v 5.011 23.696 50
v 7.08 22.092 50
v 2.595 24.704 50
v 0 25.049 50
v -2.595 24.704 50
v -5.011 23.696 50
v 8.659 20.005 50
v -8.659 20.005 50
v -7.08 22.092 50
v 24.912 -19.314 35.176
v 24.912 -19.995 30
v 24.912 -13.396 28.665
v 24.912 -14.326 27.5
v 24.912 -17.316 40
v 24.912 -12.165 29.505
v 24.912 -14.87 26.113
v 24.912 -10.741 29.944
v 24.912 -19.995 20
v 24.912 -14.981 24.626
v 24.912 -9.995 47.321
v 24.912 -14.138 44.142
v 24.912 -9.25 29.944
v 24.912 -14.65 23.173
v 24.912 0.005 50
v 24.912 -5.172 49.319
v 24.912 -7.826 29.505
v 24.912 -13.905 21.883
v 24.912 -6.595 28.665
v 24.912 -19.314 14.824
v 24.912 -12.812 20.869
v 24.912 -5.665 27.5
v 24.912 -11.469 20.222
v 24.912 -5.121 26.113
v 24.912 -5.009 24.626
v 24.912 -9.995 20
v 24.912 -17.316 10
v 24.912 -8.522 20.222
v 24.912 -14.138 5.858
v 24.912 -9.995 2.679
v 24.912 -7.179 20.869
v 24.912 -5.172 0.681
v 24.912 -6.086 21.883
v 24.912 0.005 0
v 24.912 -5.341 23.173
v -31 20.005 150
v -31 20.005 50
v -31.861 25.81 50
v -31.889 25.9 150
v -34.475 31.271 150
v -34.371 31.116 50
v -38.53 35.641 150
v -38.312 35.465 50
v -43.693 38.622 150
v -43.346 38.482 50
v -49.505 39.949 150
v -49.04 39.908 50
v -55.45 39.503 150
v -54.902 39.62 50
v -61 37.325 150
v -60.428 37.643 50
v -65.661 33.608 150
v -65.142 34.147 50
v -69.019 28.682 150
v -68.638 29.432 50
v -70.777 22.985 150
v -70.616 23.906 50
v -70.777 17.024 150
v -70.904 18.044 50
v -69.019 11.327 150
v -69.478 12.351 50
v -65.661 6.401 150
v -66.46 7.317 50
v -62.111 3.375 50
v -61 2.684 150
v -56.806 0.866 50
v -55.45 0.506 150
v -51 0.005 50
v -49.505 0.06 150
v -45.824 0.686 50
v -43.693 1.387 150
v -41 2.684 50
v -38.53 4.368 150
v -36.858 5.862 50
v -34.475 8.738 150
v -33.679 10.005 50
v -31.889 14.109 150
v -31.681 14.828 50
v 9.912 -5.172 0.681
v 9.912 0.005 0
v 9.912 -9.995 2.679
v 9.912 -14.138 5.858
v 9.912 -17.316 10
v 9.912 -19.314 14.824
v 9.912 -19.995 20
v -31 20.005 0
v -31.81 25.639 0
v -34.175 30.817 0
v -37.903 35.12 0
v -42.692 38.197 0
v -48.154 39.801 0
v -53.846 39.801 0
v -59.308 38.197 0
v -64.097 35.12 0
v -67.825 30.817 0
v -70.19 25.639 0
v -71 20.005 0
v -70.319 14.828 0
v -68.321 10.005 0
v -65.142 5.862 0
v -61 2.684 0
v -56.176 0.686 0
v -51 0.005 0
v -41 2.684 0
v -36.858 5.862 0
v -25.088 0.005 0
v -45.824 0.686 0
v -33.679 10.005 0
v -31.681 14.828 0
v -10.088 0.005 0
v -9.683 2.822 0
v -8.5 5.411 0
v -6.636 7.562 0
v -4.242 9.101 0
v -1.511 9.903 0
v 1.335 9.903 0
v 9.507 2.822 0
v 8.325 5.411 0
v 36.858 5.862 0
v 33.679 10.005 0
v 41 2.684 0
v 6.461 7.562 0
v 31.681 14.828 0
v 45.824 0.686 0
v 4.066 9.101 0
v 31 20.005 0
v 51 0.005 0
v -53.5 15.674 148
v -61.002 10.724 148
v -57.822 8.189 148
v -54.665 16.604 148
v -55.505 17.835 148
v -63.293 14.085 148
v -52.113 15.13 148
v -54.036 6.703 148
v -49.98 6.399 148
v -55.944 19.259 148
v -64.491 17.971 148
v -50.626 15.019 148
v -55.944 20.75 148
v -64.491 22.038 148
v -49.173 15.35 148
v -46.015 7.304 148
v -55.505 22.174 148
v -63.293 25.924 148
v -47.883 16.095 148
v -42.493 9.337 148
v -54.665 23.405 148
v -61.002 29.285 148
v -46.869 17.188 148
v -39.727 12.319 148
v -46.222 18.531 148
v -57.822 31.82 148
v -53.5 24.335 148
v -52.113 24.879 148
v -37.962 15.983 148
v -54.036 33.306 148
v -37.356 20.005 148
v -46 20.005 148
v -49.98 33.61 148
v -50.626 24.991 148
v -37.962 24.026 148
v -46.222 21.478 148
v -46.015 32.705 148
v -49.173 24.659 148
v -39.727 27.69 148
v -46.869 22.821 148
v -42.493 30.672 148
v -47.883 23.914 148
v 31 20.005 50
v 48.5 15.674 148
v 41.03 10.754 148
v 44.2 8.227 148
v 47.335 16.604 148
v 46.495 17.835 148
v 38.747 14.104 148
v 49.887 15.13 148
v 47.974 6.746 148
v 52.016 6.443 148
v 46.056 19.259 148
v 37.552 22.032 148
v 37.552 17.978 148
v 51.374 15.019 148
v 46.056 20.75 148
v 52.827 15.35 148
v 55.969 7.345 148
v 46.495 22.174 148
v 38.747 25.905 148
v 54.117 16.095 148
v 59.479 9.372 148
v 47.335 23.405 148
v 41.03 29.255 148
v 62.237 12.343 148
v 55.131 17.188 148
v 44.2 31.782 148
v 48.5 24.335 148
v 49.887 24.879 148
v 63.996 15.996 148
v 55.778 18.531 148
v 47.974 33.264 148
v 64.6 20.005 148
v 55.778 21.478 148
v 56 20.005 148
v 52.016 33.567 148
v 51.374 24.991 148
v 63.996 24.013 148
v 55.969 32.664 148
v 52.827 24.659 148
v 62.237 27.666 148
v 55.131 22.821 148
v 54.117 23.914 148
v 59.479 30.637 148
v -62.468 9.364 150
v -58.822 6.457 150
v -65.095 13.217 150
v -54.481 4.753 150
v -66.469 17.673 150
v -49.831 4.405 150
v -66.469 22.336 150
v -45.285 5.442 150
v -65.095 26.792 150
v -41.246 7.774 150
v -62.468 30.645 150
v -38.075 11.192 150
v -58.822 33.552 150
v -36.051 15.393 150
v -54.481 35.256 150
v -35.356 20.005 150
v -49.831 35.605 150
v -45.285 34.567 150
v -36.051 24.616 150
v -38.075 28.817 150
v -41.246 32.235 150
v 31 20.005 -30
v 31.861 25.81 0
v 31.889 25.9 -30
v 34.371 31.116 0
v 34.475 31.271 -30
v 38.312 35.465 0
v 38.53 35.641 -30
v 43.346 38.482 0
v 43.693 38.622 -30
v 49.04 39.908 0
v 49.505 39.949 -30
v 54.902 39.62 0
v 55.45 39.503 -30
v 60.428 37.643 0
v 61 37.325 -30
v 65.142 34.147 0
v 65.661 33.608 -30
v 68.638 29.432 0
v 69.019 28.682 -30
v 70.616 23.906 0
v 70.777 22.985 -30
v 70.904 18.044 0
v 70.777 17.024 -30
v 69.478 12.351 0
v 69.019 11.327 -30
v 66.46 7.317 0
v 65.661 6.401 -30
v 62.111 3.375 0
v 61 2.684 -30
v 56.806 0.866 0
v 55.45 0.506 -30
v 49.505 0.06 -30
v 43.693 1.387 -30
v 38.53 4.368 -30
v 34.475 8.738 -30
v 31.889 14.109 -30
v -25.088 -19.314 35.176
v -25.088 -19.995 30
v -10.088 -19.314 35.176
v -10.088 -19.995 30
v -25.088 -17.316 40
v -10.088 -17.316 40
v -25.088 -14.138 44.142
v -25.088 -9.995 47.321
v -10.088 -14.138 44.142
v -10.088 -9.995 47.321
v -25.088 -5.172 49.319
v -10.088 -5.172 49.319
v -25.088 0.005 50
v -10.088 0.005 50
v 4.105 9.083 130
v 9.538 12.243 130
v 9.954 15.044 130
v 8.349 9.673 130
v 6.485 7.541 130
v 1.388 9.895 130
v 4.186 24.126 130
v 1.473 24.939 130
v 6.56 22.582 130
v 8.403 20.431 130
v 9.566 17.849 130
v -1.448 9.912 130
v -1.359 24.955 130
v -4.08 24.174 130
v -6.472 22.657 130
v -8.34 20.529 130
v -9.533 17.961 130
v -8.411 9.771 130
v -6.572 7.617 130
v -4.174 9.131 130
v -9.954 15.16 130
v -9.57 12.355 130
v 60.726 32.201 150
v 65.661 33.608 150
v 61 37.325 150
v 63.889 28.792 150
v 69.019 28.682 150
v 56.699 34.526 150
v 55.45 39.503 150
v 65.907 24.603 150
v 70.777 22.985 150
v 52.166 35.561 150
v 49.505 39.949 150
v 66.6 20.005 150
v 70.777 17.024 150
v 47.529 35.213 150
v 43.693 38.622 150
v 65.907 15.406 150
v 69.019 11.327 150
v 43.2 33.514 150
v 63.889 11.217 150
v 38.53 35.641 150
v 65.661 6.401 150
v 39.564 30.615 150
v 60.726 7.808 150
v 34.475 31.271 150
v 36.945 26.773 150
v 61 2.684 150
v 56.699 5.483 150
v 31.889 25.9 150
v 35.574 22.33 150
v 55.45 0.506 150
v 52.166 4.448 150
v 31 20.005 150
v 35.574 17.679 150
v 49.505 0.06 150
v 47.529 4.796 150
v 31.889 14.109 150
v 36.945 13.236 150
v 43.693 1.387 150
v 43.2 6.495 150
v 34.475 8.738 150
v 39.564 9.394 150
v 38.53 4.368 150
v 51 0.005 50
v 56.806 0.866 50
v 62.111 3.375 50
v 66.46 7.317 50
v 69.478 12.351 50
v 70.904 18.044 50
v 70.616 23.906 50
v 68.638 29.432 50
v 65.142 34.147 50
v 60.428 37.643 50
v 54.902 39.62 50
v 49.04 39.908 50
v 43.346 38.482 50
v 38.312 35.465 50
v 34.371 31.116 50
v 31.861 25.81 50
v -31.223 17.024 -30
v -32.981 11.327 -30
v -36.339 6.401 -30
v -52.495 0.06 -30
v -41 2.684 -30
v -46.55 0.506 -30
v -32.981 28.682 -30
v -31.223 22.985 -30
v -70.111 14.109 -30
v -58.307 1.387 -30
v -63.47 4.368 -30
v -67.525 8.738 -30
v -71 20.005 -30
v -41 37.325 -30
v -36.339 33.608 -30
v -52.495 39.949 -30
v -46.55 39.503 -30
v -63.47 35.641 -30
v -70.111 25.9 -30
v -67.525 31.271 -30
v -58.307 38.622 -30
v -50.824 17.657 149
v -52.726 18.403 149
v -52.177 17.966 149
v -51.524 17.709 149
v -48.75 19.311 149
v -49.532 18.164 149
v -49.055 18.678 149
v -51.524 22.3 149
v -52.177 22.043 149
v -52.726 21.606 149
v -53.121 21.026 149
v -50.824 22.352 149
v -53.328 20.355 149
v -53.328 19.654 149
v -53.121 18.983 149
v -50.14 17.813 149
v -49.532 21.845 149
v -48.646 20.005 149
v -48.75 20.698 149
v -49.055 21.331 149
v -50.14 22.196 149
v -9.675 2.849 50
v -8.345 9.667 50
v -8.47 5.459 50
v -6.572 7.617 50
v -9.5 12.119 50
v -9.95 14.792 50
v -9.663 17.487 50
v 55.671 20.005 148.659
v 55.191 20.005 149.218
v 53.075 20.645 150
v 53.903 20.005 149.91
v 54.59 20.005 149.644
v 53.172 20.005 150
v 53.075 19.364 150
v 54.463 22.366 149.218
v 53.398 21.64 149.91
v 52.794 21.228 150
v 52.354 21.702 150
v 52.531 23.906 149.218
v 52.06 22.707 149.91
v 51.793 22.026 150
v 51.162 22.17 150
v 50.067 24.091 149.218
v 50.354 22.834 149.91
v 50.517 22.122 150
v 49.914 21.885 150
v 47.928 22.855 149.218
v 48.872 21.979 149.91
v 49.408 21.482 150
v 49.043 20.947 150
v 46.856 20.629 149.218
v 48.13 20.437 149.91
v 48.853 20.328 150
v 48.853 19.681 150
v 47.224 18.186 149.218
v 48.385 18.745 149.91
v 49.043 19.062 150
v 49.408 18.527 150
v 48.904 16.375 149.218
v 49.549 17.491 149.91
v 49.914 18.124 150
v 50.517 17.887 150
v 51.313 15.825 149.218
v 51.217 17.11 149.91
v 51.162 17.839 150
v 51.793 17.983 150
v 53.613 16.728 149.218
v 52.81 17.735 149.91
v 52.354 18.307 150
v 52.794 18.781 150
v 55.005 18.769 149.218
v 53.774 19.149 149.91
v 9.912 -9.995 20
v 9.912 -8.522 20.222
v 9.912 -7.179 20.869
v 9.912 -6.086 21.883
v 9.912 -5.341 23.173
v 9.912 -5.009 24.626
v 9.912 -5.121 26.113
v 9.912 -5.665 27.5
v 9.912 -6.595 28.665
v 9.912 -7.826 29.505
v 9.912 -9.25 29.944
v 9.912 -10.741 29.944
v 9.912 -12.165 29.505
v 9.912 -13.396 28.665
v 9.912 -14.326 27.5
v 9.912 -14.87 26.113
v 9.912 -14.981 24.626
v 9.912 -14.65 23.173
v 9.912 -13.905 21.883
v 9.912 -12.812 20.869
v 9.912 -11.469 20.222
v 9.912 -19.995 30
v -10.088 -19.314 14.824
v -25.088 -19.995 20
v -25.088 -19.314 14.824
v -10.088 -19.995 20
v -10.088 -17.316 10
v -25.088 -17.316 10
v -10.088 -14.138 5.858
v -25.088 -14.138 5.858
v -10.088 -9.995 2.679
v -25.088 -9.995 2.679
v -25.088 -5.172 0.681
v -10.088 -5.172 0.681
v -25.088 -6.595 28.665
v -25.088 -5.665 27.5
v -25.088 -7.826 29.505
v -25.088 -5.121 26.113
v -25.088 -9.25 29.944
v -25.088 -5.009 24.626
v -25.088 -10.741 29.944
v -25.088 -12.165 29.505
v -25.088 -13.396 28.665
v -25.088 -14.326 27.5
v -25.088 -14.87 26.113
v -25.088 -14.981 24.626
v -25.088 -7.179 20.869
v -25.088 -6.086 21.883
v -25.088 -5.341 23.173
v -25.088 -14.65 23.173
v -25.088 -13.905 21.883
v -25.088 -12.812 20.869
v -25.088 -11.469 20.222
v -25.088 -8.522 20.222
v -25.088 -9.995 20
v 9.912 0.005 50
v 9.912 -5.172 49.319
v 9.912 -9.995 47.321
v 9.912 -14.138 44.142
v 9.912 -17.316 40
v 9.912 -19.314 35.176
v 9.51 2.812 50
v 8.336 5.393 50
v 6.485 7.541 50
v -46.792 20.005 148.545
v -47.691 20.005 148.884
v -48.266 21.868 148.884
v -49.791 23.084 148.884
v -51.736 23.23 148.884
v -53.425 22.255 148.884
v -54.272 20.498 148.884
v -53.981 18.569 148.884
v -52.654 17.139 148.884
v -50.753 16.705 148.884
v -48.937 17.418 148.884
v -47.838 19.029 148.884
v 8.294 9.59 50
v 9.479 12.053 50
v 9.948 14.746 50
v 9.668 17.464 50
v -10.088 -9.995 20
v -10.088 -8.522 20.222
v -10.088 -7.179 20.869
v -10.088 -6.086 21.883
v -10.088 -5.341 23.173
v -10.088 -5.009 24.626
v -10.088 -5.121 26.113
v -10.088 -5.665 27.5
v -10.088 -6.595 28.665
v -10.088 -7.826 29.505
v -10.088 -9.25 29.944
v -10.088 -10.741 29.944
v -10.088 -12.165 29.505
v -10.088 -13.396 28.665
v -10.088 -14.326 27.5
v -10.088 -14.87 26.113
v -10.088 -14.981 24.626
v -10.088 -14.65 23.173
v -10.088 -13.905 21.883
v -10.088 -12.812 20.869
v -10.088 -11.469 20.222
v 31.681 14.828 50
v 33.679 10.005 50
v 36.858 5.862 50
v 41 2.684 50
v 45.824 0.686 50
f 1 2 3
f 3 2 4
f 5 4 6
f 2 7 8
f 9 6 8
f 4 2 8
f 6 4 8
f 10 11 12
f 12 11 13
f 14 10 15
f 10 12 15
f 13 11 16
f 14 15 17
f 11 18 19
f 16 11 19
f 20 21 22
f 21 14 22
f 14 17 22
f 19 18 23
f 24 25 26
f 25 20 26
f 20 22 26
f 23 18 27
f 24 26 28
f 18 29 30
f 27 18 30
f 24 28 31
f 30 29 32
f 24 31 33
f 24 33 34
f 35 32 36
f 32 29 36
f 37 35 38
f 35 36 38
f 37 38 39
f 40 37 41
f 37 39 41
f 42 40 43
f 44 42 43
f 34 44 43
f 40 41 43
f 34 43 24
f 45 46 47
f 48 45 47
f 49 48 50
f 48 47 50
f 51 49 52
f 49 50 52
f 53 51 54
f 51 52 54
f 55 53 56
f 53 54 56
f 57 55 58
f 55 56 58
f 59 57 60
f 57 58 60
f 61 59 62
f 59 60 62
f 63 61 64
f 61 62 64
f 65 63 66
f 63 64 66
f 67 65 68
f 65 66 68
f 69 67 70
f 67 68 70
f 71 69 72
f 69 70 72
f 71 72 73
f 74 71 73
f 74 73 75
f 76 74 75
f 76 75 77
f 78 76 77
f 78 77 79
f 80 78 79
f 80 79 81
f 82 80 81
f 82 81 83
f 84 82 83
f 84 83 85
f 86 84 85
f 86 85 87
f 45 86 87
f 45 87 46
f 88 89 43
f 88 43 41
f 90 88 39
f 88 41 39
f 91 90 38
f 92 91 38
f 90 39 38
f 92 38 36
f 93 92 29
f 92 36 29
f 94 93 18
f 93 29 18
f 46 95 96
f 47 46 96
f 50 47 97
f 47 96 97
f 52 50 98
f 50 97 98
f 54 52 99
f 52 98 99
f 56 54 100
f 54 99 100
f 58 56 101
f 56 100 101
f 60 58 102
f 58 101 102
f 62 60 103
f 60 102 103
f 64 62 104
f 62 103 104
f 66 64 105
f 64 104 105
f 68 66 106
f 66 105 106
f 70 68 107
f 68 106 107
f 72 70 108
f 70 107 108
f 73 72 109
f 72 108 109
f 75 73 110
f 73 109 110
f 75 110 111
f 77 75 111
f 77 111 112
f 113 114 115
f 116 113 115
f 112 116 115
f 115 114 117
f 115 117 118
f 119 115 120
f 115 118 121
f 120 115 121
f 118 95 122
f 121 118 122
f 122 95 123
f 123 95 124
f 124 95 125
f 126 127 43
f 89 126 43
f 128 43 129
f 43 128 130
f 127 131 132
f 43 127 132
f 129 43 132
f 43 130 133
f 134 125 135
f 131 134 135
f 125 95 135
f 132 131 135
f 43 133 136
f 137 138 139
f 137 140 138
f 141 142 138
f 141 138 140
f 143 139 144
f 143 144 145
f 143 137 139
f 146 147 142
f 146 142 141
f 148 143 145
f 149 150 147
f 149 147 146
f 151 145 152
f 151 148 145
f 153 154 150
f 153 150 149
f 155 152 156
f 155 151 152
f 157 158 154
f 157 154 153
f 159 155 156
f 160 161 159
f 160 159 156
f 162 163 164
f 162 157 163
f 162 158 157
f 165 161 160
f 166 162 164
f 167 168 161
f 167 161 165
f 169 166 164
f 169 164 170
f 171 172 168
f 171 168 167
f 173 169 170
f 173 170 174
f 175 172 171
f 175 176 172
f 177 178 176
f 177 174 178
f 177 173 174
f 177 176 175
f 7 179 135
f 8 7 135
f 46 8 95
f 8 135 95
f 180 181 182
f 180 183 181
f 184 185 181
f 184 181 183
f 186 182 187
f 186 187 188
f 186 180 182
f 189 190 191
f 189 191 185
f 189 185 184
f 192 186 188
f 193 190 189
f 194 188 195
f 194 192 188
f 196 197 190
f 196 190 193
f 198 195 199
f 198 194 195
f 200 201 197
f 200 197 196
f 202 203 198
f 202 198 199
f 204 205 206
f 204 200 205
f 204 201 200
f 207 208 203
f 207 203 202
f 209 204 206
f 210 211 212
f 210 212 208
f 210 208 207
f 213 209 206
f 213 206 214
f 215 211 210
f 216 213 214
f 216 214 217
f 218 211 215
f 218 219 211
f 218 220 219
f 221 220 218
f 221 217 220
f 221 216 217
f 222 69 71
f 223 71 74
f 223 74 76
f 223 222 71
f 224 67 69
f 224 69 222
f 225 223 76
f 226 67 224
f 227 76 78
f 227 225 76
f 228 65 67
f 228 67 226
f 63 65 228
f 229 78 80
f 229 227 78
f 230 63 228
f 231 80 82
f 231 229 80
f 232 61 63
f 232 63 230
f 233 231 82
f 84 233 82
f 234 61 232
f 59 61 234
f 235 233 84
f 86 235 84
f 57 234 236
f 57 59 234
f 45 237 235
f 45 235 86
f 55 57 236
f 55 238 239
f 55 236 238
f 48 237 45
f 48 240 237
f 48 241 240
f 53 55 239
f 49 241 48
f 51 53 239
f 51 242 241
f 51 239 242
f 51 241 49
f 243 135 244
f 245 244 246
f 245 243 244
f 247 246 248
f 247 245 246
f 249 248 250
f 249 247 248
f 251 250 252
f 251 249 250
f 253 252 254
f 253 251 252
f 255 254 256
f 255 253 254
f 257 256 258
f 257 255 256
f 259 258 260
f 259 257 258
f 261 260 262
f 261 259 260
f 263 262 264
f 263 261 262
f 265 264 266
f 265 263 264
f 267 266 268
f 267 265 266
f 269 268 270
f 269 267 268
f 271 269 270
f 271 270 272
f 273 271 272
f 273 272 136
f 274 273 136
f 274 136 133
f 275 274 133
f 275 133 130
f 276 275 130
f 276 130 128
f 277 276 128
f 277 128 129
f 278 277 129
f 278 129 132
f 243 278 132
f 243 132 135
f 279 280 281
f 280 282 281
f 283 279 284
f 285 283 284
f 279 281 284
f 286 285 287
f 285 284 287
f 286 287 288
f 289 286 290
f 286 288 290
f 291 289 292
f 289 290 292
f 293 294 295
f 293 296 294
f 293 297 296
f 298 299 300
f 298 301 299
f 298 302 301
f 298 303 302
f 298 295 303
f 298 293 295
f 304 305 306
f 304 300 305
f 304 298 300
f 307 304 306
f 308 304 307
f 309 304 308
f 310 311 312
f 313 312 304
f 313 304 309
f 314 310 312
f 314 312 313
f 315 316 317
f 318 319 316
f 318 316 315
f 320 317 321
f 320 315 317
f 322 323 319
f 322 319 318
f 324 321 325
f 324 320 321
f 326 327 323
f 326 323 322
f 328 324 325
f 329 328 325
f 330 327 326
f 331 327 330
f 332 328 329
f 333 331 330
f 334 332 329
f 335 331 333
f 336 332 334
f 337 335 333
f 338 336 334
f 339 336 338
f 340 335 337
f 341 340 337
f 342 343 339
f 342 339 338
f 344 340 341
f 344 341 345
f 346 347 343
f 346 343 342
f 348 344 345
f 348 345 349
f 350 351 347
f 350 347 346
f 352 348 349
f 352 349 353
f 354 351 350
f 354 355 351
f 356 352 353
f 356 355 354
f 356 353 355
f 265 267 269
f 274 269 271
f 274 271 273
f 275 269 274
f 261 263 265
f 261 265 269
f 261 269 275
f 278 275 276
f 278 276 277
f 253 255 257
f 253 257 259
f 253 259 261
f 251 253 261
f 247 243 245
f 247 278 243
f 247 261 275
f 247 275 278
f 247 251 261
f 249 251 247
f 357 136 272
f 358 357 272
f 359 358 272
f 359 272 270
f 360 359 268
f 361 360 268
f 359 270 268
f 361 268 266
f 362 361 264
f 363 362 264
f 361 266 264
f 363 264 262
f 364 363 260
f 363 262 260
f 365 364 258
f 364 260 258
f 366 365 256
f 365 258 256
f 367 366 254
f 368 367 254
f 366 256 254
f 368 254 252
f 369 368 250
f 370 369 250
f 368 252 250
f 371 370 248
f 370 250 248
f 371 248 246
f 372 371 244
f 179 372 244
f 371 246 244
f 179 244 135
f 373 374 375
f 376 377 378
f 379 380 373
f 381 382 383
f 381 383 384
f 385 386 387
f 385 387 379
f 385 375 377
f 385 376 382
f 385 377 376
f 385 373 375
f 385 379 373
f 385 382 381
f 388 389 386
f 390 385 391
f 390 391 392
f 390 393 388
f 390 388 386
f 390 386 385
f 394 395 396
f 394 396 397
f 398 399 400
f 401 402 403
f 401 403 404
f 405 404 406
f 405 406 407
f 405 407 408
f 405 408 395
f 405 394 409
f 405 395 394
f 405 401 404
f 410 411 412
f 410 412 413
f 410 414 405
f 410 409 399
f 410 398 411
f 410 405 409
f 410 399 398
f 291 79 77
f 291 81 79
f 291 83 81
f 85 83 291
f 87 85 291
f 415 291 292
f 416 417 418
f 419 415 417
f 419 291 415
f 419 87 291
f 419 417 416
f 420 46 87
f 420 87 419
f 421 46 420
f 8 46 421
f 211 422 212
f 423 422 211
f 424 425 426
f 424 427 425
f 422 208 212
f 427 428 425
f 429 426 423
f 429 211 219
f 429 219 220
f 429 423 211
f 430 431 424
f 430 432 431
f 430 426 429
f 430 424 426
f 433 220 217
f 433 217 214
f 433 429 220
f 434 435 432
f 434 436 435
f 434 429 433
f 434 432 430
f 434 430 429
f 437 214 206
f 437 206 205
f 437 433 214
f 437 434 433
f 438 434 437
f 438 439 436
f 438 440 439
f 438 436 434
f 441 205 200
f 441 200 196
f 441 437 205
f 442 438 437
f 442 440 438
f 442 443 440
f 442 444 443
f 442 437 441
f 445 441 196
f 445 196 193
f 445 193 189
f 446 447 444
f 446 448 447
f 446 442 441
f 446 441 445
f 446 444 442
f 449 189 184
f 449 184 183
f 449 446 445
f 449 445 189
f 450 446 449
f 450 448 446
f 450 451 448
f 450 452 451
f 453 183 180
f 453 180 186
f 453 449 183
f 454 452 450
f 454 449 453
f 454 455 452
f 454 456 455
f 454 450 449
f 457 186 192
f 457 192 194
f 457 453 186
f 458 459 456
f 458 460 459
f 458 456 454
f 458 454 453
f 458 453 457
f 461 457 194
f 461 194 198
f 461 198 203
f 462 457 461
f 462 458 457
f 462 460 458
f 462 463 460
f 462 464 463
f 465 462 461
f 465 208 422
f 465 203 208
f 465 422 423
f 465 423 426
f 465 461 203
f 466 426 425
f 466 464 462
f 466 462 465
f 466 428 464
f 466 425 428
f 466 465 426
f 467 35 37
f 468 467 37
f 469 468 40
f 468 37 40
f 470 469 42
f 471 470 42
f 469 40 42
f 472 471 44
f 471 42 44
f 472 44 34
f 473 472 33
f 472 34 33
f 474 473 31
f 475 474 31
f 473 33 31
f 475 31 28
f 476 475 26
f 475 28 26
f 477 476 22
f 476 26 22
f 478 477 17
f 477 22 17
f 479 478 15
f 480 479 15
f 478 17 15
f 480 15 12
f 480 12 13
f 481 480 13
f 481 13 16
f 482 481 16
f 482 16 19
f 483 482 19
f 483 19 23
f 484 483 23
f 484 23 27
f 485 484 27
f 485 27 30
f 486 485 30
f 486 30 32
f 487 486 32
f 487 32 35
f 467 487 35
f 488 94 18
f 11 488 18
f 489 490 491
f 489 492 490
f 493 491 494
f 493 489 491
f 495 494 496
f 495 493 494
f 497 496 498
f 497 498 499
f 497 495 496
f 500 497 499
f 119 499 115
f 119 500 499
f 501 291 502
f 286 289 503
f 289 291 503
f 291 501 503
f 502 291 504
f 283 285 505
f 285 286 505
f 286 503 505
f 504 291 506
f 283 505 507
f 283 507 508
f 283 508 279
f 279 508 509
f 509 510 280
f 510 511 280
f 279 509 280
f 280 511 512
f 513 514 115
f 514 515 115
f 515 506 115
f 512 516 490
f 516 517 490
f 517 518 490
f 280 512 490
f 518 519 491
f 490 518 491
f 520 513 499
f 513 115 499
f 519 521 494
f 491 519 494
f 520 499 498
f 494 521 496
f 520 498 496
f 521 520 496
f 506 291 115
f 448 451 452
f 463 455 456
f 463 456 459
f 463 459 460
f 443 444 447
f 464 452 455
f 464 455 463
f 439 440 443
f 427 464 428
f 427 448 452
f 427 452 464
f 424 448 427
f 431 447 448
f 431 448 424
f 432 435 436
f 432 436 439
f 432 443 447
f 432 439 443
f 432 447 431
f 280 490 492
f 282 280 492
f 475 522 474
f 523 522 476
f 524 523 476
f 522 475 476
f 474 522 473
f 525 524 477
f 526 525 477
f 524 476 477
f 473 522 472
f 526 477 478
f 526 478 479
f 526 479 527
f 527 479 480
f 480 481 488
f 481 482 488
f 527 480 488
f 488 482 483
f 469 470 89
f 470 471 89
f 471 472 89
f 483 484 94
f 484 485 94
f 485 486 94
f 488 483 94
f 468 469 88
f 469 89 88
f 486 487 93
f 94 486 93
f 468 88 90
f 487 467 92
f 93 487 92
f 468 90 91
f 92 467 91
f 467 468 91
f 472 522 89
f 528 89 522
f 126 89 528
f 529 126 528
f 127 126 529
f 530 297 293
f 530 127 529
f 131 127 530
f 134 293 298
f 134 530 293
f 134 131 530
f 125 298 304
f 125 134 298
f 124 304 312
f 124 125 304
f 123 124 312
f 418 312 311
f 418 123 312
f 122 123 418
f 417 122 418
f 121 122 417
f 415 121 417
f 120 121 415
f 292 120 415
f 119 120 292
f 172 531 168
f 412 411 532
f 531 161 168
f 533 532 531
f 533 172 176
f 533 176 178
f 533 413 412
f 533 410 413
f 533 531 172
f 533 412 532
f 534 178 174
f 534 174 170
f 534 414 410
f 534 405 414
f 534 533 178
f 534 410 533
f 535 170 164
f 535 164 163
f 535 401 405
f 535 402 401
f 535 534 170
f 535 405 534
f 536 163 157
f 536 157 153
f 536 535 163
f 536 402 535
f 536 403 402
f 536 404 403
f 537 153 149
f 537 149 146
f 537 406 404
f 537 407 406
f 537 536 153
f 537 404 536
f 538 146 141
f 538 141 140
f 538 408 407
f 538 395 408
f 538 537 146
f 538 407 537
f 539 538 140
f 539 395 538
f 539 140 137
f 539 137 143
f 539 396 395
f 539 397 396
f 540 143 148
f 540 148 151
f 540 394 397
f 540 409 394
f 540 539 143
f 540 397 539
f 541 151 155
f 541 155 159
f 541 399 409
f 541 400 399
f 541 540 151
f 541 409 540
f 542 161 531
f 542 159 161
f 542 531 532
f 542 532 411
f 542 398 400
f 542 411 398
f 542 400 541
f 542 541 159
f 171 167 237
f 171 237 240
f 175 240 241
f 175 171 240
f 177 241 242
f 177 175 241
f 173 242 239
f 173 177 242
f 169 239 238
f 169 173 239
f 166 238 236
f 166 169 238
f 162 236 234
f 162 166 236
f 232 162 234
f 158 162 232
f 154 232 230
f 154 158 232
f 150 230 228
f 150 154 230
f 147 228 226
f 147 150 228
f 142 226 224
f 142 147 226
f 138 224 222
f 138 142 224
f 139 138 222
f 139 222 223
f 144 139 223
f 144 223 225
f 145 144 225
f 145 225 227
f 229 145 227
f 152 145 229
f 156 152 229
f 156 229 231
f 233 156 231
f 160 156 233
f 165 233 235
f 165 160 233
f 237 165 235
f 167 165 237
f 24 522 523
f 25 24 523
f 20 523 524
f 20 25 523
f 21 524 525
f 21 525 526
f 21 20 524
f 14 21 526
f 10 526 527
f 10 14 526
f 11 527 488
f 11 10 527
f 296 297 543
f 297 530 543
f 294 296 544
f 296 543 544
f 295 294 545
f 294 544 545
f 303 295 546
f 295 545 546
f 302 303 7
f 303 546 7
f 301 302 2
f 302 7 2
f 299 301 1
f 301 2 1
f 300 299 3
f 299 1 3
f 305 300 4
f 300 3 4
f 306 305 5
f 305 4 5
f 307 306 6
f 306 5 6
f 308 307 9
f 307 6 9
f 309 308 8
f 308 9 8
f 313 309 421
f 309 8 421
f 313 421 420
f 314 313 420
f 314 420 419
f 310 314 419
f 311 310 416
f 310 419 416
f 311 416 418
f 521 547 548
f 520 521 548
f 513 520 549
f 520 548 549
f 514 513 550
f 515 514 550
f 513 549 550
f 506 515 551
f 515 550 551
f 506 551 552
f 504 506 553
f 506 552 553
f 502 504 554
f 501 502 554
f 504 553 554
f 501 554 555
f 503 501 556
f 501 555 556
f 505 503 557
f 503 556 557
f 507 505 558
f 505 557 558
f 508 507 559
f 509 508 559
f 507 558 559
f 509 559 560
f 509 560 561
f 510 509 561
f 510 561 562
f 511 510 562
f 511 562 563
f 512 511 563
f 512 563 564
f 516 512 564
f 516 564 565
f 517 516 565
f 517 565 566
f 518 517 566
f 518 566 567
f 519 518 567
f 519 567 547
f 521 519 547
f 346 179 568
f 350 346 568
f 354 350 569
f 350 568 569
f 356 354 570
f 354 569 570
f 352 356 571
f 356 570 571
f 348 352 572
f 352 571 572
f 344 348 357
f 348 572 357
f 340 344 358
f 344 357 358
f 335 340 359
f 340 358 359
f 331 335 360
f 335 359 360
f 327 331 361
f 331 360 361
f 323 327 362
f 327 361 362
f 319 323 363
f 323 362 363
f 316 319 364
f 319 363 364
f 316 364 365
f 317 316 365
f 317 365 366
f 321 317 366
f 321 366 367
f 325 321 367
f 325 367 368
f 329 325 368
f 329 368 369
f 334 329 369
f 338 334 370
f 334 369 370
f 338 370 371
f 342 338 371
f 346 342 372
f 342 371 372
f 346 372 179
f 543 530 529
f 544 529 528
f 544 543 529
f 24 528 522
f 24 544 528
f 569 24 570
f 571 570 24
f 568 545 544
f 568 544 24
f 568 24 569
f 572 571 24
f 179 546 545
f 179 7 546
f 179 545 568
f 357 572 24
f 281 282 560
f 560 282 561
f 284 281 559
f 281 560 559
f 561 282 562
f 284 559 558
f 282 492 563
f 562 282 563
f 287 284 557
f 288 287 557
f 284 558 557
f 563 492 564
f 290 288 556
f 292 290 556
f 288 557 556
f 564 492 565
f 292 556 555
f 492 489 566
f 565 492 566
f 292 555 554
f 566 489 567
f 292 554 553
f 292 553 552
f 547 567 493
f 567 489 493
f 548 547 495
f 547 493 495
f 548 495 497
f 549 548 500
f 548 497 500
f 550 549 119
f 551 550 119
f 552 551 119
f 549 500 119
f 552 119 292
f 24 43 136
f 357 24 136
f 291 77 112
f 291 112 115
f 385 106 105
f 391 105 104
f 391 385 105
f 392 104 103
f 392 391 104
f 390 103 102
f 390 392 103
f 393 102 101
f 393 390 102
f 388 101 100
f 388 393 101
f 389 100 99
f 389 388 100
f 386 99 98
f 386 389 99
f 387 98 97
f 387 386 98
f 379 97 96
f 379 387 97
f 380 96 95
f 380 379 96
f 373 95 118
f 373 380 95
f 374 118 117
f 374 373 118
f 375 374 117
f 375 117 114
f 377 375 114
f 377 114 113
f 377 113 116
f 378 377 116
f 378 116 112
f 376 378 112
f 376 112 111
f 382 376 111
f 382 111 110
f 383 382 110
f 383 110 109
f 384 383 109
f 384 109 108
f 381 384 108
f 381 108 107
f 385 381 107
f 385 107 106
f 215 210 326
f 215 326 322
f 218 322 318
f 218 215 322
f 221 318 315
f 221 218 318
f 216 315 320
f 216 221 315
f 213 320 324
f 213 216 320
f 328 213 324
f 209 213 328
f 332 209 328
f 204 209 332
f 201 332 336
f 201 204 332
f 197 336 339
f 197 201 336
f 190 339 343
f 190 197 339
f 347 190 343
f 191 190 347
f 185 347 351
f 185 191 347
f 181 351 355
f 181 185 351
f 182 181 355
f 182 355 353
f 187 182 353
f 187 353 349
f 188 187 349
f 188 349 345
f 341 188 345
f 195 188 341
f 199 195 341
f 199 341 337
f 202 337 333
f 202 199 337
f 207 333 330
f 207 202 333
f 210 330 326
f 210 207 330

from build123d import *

# Parameters (mm, degrees)
BOSS_EXTRUDE1_DEPTH      = 50
SKETCH4_R                = 5
CUT_EXTRUDE1_DEPTH       = 116.323487875
FILLET2_R                = 20
SKETCH6_R                = 20
BOSS_EXTRUDE4_DEPTH      = 100
BOSS_EXTRUDE5_START      = 30
SKETCH7_R                = 20
BOSS_EXTRUDE5_DEPTH      = 30
SKETCH8_R                = 9.954491404
BOSS_EXTRUDE8_DEPTH      = 80
CUT_EXTRUDE2_DEPTH       = 130.001408198
CUT_EXTRUDE2_DEPTH_BACK  = 130.001408198
SKETCH9_R                = 13.643836255
CUT_EXTRUDE3_DEPTH       = 2
BOSS_EXTRUDE9_START      = 148
BOSS_EXTRUDE9_OUTLINE_R  = 5
BOSS_EXTRUDE9_DEPTH      = 1
CHAMFER1_SIZE            = 2
SKETCH11_R               = 13.6
CUT_EXTRUDE4_DEPTH       = 2
BOSS_EXTRUDE10_START     = 148
BOSS_EXTRUDE10_OUTLINE_R = 5
BOSS_EXTRUDE10_DEPTH     = 2
FILLET5_R                = 4
FILLET6_R                = 3
CHAMFER3_SIZE            = 2


# Read off the part's stored shape, not the designer's step: Boss-Extrude9, Boss-Extrude10
# Some blends are built 0.0001 mm under size
with BuildPart() as part:
    # Sketch1 → Boss-Extrude1 (new body)
    with BuildSketch(Plane.XY):
        with BuildLine():
            Line((-25.087834251, -19.995458795), (-10.087834251, -19.995458795))
            Line((-10.087834251, -19.995458795), (-10.087834251, 0.004541205))
            Line((-10.087834251, 0.004541205), (9.912165749, 0.004541205))
            Line((9.912165749, 0.004541205), (9.912165749, -19.995458795))
            Line((9.912165749, -19.995458795), (24.912165749, -19.995458795))
            Line((24.912165749, -19.995458795), (24.912165749, 0.004541205))
            Line((24.912165749, 0.004541205), (51, 0.004541205))
            ThreePointArc((51, 0.004541205), (65.142135624, 34.146676829), (31, 20.004541205))
            Line((31, 20.004541205), (-31, 20.004541205))
            ThreePointArc((-31, 20.004541205), (-65.142135624, 34.146676829), (-51, 0.004541205))
            Line((-51, 0.004541205), (-25.087834251, 0.004541205))
            Line((-25.087834251, 0.004541205), (-25.087834251, -19.995458795))
        make_face()
    extrude(amount=BOSS_EXTRUDE1_DEPTH)

    # Sketch4 → Cut-Extrude1 (cut, through all)
    with BuildSketch(Plane(origin=(24.912165749, 0, 0), x_dir=(0, 0, -1), z_dir=(1, 0, 0))):
        with Locations((-25, -9.995458795)):
            Circle(SKETCH4_R)
    extrude(amount=-CUT_EXTRUDE1_DEPTH, mode=Mode.SUBTRACT)

    # Fillet2
    fillet2_edges = [part.edges().sort_by_distance(p)[0] for p in [
        (-17.587834251, -19.995458795, 50),
        (-17.587834251, -19.995458795, 0),
        (17.412165749, -19.995458795, 0),
        (17.412165749, -19.995458795, 50),
    ]]
    fillet(fillet2_edges, radius=FILLET2_R)

    # Sketch6 → Boss-Extrude4 (add)
    with BuildSketch(Plane.XY.offset(50)):
        with Locations((-51, 20.004541205)):
            Circle(SKETCH6_R)
        with Locations(Location((51, 20.004541205, 0), (0, 0, 180))):
            Circle(SKETCH6_R)
    extrude(amount=BOSS_EXTRUDE4_DEPTH)

    # Sketch7 → Boss-Extrude5 (add)
    with BuildSketch(Plane(origin=(0, 0, 0), x_dir=(-1, 0, 0), z_dir=(0, 0, -1)).offset(BOSS_EXTRUDE5_START)):
        with Locations((-51, 20.004541205)):
            Circle(SKETCH7_R)
        with Locations((51, 20.004541205)):
            Circle(SKETCH7_R)
    extrude(amount=-BOSS_EXTRUDE5_DEPTH)

    # Sketch8 → Boss-Extrude8 (add)
    with BuildSketch(Plane.XY.offset(50)):
        with Locations(Location((0, 15.094063168, 0), (0, 0, 150.442767445))):
            Circle(SKETCH8_R)
    extrude(amount=BOSS_EXTRUDE8_DEPTH)

    # Sketch5 → Cut-Extrude2 (cut, two sides: drawn at the far end of the back side and taken through both)
    with BuildSketch(Plane.XY.offset(50).offset(-CUT_EXTRUDE2_DEPTH_BACK)):
        with BuildLine():
            Line((-10.087834251, 0.004541205), (9.912165749, 0.004541205))
            ThreePointArc((9.912165749, 0.004541205), (-0.087834251, 10.004541205), (-10.087834251, 0.004541205))
        make_face()
    extrude(amount=CUT_EXTRUDE2_DEPTH + CUT_EXTRUDE2_DEPTH_BACK, mode=Mode.SUBTRACT)

    # Sketch9 → Cut-Extrude3 (cut)
    with BuildSketch(Plane.XY.offset(150)):
        with Locations((-51, 20.004541205)):
            Circle(SKETCH9_R)
    extrude(amount=-CUT_EXTRUDE3_DEPTH, mode=Mode.SUBTRACT)

    # Boss-Extrude9 outline → Boss-Extrude9 (add)
    with BuildSketch(Plane.XY.offset(BOSS_EXTRUDE9_START)):
        with Locations((-51, 20.004541205)):
            Circle(BOSS_EXTRUDE9_OUTLINE_R)
    extrude(amount=BOSS_EXTRUDE9_DEPTH)

    # Chamfer1
    chamfer1_edges = [part.edges().sort_by_distance(p)[0] for p in [
        (-64.643836255, 20.004541205, 150),
    ]]
    chamfer(chamfer1_edges, length=CHAMFER1_SIZE - 0.0001)  # a hair under: the kernel refuses the full size

    # Sketch11 → Cut-Extrude4 (cut)
    with BuildSketch(Plane.XY.offset(150)):
        with Locations((51, 20.004541205)):
            Circle(SKETCH11_R)
    extrude(amount=-CUT_EXTRUDE4_DEPTH, mode=Mode.SUBTRACT)

    # Boss-Extrude10 outline → Boss-Extrude10 (add)
    with BuildSketch(Plane.XY.offset(BOSS_EXTRUDE10_START)):
        with Locations((51, 20.004541205)):
            Circle(BOSS_EXTRUDE10_OUTLINE_R)
    extrude(amount=BOSS_EXTRUDE10_DEPTH)

    # Fillet5
    # the kernel refuses this fillet: 4 mm, written as the material it takes off along each edge
    with BuildSketch(Plane(origin=(-51, 20.004541205, 149), x_dir=(1, 0, 0), z_dir=(0, -1, 0))) as fillet5_piece_1:
        with BuildLine():
            CenterArc((2.354248689, -4), FILLET5_R, 48.590377891, 41.409622109)
            Line((2.354248689, 0), (2.354248689, 0.08))
            Line((2.354248689, 0.08), (5, 0.08))
            Line((5, 0.08), (5.08, 0))
            ThreePointArc((5.08, 0), (5.08, -0.5), (5.052915026, -0.94))
            Line((5.052915026, -0.94), (5, -1))
        make_face()
    revolve(axis=Axis((-51, 20.004541205, 149), (0, 0, 1)), mode=Mode.SUBTRACT)

    # Fillet6
    # the kernel refuses this fillet: 3 mm, written as the material it takes off along each edge
    with BuildSketch(Plane(origin=(51, 20.004541205, 150), x_dir=(1, 0, 0), z_dir=(0, -1, 0))) as fillet6_piece_1:
        with BuildLine():
            CenterArc((2.171572875, -3), FILLET6_R, 19.471220634, 70.528779366)
            Line((2.171572875, 0), (2.171572875, 0.06))
            Line((2.171572875, 0.06), (5, 0.06))
            Line((5, 0.06), (5.06, 0))
            ThreePointArc((5.06, 0), (5.06, -1), (5.056568542, -1.98))
            Line((5.056568542, -1.98), (5, -2))
        make_face()
    revolve(axis=Axis((51, 20.004541205, 150), (0, 0, 1)), mode=Mode.SUBTRACT)

    # Chamfer3
    chamfer3_edges = [part.edges().sort_by_distance(p)[0] for p in [
        (37.4, 20.004541205, 150),
    ]]
    chamfer(chamfer3_edges, length=CHAMFER3_SIZE - 0.0001)  # a hair under: the kernel refuses the full size


solid = part.part
